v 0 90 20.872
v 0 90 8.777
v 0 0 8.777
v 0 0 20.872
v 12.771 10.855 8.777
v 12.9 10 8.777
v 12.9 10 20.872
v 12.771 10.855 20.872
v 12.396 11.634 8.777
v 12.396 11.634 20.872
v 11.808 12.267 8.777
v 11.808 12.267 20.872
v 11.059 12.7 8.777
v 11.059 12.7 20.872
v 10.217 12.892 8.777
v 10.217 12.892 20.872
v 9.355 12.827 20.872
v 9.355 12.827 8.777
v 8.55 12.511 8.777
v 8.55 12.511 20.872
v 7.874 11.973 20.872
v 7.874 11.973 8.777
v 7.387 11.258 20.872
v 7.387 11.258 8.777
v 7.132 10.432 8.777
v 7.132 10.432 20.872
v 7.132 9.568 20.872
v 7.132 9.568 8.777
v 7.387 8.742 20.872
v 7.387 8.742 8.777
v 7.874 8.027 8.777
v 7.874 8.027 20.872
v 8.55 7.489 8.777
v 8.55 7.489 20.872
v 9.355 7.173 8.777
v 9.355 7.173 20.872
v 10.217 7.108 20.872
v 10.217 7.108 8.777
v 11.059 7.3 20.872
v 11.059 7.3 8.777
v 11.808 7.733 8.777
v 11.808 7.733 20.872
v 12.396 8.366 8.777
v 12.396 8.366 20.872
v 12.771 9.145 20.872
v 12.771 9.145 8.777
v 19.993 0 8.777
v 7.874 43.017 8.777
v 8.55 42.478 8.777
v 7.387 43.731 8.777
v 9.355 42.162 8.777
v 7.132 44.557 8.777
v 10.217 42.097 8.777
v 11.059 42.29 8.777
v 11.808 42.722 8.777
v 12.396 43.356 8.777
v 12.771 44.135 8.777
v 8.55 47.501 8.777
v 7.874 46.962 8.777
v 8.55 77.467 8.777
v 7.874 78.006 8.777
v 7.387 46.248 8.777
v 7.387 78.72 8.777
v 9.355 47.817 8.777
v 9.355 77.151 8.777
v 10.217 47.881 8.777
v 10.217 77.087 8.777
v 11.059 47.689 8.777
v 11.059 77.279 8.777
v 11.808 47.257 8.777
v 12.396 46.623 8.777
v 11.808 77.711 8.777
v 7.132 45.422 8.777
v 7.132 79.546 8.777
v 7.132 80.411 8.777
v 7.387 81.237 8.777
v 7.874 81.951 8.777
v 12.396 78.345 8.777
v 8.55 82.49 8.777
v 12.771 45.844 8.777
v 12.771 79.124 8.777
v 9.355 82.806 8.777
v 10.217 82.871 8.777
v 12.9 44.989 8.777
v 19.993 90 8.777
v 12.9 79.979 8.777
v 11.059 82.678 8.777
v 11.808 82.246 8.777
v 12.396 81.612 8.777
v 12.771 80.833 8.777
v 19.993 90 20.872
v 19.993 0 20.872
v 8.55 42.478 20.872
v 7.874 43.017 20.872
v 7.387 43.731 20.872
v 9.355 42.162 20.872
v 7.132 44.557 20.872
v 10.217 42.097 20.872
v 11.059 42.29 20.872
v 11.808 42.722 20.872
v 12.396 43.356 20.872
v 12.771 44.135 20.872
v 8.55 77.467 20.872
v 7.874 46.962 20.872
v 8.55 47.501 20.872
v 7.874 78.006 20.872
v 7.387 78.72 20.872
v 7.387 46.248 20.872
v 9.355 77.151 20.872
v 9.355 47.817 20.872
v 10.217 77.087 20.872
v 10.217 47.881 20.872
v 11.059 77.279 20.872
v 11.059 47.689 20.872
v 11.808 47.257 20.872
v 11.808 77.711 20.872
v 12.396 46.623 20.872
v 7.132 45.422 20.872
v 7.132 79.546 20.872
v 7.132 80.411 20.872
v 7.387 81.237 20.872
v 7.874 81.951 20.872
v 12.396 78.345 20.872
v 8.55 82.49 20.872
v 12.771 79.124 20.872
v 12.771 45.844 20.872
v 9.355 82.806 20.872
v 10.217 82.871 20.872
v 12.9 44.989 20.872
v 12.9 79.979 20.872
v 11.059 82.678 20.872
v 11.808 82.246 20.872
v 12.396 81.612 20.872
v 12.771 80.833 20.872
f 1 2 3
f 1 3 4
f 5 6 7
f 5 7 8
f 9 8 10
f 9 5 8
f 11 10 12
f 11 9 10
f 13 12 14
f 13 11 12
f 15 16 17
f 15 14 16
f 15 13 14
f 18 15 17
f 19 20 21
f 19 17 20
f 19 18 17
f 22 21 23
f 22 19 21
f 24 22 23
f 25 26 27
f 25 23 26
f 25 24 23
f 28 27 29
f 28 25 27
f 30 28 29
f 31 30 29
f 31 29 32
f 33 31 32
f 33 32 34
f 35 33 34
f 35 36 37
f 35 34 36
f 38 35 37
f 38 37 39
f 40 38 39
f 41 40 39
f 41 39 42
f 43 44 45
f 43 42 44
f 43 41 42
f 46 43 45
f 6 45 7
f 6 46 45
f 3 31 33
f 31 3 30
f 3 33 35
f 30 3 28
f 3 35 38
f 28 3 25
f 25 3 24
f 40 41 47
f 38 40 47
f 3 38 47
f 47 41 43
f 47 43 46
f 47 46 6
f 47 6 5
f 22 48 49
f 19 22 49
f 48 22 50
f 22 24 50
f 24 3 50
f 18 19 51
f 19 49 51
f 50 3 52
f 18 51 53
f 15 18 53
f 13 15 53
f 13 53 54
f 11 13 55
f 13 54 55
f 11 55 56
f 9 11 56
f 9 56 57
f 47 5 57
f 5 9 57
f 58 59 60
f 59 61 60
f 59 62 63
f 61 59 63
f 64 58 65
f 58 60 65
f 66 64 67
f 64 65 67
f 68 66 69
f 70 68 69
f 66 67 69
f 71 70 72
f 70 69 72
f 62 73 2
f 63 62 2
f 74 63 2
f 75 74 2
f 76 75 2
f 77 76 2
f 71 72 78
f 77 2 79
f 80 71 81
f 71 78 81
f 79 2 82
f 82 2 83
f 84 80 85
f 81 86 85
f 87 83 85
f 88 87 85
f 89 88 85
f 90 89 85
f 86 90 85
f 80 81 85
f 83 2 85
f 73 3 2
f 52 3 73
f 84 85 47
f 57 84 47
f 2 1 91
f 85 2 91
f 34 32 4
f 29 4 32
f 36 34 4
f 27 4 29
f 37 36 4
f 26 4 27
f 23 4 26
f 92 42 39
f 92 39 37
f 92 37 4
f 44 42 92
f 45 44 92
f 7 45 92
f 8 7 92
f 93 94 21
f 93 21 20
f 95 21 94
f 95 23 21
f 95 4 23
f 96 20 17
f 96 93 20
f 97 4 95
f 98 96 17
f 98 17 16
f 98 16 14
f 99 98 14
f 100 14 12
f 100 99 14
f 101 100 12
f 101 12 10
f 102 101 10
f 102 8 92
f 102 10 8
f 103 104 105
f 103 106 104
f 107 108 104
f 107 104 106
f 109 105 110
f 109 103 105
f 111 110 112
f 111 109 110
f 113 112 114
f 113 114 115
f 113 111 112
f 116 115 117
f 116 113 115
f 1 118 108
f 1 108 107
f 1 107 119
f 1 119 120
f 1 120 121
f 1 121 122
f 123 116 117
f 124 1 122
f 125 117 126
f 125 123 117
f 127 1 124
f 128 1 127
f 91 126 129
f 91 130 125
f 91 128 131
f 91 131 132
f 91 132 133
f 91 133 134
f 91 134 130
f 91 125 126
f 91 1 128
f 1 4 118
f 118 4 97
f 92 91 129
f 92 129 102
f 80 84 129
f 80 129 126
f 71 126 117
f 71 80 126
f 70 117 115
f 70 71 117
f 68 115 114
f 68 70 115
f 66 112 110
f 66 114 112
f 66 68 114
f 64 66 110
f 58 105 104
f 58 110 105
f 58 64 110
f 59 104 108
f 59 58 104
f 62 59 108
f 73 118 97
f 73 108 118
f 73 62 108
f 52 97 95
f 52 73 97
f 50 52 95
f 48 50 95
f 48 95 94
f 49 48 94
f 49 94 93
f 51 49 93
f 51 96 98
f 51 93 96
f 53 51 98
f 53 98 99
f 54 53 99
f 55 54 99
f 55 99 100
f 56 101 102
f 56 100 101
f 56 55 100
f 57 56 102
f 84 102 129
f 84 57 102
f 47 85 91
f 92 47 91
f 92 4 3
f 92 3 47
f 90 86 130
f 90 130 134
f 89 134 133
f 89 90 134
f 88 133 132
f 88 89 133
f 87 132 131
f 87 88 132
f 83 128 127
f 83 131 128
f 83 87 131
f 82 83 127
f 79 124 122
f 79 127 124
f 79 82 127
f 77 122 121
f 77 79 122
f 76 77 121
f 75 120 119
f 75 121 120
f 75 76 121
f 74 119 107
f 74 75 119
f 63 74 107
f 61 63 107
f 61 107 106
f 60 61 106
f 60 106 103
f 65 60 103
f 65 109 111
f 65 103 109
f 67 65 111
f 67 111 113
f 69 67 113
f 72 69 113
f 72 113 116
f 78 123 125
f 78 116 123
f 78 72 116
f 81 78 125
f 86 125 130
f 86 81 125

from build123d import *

# Parameters (mm, degrees)
SKETCH010_R      = 2.9
EXTRUDE010_DEPTH = 20
SKETCH009_W      = 19.993101
SKETCH009_H      = 12.095101
EXTRUDE009_DEPTH = 90


with BuildPart() as tornillos003:
    # Sketch010 (on Face4 of Extrude009) → Extrude010 (new body)
    with BuildSketch(Plane.XY.offset(20.871752)):
        with Locations((10, -80)):
            Circle(SKETCH010_R)
        with Locations((10, -45.010692)):
            Circle(SKETCH010_R)
        with Locations((10, -10.021384)):
            Circle(SKETCH010_R)
    extrude(amount=EXTRUDE010_DEPTH)


with BuildPart() as tornillos003_1:
    # Extrude010 placement: moved
    add(tornillos003.part.moved(Location((0, 0, -15))))


with BuildPart() as soporte_imprimir:
    # Sketch009 → Extrude009 (new body)
    with BuildSketch(Plane.XZ):
        with Locations((9.99655, 14.824202)):
            Rectangle(SKETCH009_W, SKETCH009_H)
    extrude(amount=EXTRUDE009_DEPTH)

    # Cut003: cut Tornillos003
    add(tornillos003_1.part, mode=Mode.SUBTRACT)


with BuildPart() as soporte_imprimir_1:
    # Cut003 placement: moved
    add(soporte_imprimir.part.moved(Location((0, 90, 0))))


solid = soporte_imprimir_1.part
